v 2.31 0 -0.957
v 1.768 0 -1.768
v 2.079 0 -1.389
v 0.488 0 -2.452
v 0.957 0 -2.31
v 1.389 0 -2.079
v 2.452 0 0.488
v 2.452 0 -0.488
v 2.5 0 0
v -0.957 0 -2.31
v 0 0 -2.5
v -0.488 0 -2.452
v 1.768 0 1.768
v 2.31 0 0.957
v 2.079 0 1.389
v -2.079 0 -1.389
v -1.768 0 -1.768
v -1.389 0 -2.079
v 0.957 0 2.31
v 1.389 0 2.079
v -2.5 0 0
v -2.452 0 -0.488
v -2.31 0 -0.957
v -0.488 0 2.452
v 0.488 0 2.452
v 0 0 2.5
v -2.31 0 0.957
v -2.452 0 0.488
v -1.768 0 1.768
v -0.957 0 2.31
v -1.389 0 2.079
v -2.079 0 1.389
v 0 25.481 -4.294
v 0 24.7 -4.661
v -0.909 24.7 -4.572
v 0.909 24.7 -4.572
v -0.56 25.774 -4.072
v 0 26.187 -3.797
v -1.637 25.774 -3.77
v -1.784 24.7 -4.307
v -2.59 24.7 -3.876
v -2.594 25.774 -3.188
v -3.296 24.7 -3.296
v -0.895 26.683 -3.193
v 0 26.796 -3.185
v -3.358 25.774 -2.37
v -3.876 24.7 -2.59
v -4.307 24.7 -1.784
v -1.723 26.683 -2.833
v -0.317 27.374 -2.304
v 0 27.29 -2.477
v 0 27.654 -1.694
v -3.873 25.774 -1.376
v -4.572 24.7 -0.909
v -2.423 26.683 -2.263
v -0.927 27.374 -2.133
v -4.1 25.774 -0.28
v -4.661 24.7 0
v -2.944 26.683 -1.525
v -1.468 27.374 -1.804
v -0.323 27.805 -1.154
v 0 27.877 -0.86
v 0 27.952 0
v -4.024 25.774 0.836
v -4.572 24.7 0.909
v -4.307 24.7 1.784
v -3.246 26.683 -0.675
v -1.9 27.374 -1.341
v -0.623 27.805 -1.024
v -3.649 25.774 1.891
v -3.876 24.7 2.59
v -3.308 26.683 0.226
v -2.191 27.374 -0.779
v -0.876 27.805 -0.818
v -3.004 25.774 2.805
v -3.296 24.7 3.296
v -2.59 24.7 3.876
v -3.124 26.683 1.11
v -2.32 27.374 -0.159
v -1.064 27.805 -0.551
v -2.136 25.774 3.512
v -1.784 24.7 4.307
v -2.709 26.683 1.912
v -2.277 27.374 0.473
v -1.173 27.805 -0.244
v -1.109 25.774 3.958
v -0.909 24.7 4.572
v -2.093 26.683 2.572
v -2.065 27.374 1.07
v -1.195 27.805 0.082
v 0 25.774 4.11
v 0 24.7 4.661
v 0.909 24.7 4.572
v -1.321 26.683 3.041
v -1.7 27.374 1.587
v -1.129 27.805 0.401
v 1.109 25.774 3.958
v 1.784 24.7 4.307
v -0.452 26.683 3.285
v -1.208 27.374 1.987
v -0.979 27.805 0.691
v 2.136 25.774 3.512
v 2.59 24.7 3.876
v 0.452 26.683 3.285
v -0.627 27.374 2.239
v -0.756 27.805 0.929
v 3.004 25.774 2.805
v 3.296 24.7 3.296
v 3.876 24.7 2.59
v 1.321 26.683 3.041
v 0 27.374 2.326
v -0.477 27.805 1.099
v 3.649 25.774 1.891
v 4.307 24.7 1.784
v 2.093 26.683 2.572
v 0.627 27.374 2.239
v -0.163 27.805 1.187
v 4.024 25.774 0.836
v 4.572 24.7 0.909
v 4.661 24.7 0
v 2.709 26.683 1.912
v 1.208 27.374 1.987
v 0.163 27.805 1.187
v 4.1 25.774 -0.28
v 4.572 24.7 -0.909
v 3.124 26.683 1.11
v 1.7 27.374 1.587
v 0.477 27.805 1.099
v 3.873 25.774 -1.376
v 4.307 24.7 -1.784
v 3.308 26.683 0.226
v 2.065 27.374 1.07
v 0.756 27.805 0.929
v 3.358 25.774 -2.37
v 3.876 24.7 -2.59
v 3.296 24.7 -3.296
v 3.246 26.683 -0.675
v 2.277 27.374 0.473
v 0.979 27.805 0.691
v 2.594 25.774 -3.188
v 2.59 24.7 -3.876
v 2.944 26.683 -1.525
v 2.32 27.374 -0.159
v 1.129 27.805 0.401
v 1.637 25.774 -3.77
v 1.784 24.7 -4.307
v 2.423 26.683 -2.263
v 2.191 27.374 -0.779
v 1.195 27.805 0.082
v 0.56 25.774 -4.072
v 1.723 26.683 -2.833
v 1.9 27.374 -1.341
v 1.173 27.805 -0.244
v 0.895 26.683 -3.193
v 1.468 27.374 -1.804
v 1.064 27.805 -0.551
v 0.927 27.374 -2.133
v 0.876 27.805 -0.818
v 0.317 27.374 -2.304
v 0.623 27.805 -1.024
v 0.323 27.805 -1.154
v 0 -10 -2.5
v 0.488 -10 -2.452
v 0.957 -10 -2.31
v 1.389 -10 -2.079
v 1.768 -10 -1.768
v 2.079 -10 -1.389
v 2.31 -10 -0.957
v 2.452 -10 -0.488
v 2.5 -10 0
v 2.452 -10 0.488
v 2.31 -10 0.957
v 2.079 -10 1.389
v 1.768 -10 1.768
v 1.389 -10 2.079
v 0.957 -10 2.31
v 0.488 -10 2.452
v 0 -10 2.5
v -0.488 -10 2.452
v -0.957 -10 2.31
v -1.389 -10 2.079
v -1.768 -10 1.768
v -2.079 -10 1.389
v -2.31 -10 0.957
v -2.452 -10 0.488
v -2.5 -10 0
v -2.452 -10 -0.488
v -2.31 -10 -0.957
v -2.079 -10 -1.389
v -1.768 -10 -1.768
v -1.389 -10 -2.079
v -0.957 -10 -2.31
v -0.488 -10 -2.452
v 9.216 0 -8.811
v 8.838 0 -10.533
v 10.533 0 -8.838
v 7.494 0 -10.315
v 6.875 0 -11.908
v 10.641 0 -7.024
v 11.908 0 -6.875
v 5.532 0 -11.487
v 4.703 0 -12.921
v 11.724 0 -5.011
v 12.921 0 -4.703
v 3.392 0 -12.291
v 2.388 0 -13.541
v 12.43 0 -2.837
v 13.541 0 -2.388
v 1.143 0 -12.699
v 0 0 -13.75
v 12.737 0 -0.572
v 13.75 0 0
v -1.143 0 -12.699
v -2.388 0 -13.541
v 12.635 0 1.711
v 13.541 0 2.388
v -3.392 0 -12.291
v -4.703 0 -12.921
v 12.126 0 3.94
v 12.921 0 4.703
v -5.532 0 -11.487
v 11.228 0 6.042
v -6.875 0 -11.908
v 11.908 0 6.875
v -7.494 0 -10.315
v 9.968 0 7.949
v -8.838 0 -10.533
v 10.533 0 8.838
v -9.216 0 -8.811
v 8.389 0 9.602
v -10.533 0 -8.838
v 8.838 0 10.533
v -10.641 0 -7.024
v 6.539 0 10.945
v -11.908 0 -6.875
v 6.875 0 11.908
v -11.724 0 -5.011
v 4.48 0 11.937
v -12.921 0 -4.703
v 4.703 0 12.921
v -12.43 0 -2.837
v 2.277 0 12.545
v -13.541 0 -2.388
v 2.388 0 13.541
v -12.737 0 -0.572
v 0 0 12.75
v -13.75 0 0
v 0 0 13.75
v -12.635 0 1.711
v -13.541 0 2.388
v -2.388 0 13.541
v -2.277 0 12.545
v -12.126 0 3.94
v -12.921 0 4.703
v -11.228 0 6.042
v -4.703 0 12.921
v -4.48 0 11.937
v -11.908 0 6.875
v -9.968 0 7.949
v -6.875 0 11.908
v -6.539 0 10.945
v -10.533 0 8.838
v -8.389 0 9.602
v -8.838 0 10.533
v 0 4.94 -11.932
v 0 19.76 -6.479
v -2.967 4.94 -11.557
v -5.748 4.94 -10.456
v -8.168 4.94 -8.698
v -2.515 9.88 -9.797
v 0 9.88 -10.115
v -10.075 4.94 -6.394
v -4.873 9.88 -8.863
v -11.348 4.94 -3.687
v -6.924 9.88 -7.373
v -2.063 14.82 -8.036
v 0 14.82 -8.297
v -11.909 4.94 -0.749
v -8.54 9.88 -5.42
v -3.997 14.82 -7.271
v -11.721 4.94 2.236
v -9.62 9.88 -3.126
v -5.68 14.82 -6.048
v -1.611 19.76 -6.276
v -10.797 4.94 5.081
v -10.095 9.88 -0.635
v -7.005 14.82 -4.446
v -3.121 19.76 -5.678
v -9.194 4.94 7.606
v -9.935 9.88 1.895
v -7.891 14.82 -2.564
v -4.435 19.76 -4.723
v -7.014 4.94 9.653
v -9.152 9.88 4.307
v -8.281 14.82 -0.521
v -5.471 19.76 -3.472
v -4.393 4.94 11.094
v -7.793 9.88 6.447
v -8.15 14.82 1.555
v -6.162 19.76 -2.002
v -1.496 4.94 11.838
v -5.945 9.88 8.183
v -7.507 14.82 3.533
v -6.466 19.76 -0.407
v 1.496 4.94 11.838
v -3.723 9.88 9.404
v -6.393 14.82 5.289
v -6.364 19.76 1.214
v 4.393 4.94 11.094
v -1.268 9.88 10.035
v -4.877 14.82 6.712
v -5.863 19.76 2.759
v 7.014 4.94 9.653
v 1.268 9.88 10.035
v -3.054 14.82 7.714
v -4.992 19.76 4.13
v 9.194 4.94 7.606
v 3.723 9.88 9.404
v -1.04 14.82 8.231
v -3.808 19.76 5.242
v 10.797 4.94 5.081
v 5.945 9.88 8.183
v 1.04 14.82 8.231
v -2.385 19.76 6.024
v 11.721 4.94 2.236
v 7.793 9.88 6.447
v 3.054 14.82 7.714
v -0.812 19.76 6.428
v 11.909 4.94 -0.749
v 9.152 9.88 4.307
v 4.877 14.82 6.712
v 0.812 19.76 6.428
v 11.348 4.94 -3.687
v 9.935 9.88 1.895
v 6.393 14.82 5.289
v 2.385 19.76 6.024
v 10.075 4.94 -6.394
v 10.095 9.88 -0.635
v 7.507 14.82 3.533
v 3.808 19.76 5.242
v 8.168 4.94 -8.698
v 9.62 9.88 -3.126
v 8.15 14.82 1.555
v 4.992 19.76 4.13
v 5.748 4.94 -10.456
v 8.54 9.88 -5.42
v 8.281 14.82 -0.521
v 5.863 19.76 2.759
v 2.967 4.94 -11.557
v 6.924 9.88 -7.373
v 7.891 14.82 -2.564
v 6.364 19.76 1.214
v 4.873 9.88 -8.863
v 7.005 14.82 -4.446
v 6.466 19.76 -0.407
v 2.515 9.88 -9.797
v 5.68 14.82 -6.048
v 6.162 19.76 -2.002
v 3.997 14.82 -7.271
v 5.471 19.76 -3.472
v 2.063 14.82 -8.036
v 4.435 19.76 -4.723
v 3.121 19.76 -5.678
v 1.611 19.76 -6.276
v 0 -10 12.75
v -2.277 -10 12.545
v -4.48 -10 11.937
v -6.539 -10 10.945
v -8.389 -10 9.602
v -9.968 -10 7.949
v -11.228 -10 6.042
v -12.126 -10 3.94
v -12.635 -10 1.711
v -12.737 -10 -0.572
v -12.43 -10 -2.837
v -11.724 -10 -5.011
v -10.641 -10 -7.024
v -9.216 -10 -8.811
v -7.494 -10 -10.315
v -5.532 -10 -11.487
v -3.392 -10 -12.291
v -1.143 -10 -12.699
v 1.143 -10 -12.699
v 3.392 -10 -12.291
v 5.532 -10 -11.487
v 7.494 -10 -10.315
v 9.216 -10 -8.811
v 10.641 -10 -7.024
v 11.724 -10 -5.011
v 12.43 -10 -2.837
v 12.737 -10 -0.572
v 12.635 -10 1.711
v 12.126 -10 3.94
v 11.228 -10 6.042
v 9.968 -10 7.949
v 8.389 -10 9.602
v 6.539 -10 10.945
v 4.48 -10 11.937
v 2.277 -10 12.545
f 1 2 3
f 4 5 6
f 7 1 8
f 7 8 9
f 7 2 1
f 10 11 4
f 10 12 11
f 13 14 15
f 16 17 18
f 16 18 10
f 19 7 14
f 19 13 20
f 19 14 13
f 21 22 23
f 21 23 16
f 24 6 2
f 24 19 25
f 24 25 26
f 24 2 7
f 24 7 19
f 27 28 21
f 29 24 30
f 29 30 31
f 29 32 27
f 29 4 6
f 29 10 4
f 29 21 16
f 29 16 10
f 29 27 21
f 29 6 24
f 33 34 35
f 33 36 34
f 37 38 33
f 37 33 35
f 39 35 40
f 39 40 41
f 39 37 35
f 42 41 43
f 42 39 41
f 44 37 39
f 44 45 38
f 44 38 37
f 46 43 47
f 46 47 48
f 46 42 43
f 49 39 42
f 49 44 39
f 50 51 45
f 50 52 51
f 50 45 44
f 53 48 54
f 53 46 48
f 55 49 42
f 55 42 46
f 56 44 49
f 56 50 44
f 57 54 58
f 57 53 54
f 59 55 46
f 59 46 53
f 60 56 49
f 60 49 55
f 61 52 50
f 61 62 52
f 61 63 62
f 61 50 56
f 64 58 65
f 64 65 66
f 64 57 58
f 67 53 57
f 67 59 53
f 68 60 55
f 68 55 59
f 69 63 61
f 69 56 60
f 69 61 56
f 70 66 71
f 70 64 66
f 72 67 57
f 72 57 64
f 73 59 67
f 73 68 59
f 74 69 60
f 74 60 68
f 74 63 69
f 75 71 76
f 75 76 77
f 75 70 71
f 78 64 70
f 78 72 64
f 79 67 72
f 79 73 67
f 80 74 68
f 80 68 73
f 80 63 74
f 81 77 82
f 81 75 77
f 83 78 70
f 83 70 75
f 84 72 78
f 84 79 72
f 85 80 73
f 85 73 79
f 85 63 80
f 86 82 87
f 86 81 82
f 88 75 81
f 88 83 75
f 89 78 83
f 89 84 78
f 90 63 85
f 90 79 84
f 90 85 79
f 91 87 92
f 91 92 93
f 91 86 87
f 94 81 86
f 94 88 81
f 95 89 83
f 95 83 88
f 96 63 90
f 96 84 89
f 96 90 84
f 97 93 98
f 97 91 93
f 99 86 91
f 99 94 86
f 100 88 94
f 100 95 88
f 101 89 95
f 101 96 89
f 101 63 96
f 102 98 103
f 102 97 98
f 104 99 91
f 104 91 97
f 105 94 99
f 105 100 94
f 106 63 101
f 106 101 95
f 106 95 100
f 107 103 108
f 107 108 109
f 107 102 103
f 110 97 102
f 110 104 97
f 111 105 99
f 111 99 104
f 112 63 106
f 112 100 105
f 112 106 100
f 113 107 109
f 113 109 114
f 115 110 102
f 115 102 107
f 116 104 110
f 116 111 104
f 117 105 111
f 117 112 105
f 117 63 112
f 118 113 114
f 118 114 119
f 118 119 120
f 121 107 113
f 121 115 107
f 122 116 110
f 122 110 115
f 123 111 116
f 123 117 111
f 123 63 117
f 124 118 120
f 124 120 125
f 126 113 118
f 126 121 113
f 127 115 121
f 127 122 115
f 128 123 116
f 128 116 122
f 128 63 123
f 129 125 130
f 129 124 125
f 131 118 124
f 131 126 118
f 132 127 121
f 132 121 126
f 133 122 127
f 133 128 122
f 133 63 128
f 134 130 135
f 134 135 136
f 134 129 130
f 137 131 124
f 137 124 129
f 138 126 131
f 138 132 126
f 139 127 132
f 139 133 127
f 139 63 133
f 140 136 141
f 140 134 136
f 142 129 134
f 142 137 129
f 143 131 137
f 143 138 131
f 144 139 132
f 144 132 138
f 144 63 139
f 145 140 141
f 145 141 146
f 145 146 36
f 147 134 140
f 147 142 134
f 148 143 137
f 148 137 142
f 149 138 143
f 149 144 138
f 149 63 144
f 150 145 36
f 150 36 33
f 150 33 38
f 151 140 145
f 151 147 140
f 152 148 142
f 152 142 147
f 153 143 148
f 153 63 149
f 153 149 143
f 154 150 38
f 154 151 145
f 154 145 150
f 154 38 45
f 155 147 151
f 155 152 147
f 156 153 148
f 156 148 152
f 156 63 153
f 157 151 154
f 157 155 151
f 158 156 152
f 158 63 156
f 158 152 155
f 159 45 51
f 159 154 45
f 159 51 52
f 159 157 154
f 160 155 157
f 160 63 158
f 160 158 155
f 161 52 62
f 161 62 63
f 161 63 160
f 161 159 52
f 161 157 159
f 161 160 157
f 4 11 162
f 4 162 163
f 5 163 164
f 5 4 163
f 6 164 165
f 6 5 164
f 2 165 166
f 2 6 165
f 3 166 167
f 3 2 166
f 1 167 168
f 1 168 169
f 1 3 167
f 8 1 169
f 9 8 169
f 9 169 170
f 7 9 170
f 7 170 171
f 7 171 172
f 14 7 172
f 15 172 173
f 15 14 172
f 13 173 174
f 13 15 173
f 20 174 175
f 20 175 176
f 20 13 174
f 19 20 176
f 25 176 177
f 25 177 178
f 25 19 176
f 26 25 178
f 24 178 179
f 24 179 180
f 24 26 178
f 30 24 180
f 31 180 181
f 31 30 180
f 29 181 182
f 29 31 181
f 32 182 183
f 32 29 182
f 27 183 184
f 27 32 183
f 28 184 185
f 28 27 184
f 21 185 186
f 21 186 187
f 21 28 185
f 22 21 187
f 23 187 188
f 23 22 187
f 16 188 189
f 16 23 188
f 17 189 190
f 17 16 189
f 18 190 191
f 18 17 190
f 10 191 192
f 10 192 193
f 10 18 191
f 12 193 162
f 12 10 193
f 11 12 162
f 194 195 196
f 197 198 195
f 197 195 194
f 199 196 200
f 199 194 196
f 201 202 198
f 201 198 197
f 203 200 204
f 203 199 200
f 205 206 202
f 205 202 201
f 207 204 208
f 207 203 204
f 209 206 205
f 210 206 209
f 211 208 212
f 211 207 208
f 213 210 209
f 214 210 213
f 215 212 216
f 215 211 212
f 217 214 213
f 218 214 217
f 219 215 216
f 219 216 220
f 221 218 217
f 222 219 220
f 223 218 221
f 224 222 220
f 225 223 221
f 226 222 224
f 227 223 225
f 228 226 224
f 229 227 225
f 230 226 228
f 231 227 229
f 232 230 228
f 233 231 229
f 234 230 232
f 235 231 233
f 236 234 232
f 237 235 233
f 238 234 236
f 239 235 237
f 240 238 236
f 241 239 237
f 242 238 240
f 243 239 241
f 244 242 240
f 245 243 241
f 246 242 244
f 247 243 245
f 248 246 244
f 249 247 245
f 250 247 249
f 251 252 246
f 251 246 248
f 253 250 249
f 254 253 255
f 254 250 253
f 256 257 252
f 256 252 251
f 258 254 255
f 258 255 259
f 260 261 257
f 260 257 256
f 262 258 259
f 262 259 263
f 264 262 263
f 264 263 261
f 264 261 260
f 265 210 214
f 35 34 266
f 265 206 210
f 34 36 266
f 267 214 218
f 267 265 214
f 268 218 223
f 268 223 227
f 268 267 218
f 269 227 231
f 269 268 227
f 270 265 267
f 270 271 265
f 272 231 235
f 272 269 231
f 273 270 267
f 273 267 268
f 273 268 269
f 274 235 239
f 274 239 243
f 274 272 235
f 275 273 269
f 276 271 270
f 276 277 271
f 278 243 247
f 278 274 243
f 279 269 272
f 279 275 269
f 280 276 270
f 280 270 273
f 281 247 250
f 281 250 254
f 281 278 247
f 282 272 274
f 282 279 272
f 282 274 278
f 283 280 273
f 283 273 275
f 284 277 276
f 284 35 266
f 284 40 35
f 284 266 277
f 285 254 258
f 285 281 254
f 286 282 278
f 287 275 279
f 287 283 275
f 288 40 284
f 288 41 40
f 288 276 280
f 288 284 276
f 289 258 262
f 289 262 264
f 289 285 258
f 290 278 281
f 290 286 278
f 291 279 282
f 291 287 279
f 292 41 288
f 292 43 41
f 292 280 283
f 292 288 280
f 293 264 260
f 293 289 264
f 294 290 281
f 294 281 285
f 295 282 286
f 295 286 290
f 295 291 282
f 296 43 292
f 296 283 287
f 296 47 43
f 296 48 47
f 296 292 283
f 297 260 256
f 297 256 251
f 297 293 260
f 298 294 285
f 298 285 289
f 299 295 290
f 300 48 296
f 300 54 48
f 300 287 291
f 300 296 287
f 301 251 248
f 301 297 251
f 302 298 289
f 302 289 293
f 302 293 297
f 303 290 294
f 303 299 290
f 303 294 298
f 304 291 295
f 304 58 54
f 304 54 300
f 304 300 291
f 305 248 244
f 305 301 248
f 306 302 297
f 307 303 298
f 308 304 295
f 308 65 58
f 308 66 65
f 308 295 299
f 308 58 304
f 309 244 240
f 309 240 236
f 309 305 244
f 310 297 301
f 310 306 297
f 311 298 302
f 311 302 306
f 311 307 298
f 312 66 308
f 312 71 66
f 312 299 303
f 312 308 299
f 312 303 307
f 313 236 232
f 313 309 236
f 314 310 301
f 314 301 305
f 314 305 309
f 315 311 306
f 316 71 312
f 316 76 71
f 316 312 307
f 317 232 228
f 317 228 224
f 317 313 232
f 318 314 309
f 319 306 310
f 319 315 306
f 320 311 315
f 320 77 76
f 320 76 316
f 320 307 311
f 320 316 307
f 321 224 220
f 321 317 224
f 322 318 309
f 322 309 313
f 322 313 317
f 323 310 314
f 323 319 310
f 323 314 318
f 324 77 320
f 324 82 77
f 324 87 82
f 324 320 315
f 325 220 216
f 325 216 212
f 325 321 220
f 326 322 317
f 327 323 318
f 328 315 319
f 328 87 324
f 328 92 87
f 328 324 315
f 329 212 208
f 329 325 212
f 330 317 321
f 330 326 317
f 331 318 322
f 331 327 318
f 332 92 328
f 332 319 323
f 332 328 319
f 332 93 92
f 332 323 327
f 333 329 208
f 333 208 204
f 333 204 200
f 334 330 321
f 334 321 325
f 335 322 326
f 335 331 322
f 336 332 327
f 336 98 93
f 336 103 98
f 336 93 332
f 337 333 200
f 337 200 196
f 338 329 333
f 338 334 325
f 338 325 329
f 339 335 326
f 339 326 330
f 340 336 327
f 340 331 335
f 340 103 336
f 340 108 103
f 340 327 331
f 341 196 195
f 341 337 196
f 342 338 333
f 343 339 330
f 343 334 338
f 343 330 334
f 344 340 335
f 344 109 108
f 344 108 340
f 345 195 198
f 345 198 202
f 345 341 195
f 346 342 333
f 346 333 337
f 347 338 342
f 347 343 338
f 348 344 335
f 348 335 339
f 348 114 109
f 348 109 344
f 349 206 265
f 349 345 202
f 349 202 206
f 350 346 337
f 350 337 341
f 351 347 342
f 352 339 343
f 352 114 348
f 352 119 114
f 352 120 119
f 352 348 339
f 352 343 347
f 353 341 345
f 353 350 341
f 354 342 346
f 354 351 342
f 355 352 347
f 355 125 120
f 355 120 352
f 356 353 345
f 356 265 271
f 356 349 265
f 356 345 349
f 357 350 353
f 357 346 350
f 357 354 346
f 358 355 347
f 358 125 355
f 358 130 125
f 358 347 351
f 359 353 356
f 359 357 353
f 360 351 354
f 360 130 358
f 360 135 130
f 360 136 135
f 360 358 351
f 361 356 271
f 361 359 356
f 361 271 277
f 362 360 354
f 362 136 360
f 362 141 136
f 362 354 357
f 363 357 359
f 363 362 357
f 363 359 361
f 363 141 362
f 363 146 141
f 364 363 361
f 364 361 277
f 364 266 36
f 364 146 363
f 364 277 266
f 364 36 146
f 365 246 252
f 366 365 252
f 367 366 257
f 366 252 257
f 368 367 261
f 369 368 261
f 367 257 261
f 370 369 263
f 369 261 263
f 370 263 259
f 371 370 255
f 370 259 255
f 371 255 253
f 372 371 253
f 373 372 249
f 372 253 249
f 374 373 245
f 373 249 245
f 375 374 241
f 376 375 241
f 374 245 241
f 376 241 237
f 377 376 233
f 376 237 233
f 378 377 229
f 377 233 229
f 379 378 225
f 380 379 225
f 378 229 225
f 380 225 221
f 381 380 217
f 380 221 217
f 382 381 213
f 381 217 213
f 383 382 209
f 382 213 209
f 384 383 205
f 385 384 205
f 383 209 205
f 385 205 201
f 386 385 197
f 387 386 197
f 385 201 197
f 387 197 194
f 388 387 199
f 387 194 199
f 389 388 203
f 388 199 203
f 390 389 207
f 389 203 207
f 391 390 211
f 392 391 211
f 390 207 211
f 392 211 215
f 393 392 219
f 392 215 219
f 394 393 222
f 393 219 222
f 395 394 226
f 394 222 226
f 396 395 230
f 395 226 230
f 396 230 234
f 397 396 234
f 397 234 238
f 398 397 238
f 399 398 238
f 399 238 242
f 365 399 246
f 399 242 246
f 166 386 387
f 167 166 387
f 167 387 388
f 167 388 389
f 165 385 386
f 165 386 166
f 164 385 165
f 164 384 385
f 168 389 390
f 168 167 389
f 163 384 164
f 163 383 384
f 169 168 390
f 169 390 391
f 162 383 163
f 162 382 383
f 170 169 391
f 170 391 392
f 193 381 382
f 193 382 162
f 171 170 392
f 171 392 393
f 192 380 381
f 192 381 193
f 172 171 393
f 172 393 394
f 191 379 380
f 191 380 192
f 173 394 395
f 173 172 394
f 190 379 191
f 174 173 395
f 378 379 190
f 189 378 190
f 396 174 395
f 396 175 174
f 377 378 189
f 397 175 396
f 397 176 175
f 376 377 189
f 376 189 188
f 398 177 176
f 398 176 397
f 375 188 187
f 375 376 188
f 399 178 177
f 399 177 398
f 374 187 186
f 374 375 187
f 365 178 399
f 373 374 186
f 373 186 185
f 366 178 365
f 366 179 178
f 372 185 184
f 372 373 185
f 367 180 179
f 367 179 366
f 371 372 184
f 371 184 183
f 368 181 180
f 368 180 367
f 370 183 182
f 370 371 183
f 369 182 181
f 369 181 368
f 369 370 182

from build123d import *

# Parameters (mm, degrees)
SKETCH6_R           = 12.75
SKETCH6_R_2         = 2.5
BOSS_EXTRUDE2_DEPTH = 10


with BuildPart() as part:
    # Sketch5 → Revolve2 (revolve)
    with BuildSketch(Plane.XY, mode=Mode.PRIVATE) as revolve2_sk:
        with BuildLine():
            Line((0, 0), (-13.75, 0))
            Line((-13.75, 0), (-4.661495631, 24.7))
            ThreePointArc((-4.661495631, 24.7), (-2.841825215, 27.058541596), (0, 27.951821134))
            Line((0, 27.951821134), (0, 24.7))
            Line((0, 24.7), (0, 0))
        make_face()
    revolve(revolve2_sk.sketch.rotate(Axis((0, 0, 0), (0, 1, 0)), 270), axis=Axis((0, 0, 0), (0, 1, 0)))

    # Sketch6 → Boss-Extrude2 (add)
    with BuildSketch(Plane.XZ):
        with Locations(Location((0, 0, 0), (0, 0, 90))):
            Circle(SKETCH6_R)
        with Locations(Location((0, 0, 0), (0, 0, 270))):
            Circle(SKETCH6_R_2, mode=Mode.SUBTRACT)
    extrude(amount=BOSS_EXTRUDE2_DEPTH)


solid = part.part
